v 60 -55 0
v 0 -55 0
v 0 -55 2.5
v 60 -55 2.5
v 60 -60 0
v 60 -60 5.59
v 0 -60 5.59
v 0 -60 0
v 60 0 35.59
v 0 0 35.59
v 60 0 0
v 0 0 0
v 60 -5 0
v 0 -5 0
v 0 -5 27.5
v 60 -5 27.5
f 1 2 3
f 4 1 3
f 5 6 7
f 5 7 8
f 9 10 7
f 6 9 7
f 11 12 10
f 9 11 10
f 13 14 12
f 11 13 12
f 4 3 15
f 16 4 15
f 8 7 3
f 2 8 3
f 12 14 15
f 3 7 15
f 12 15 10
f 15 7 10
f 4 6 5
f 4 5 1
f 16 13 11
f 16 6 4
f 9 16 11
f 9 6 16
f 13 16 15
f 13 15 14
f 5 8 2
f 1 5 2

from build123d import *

# Parameters (mm, degrees)
F1_DEPTH = 60


with BuildPart() as f1:
    # F0 (on Right) → F1 (new body)
    with BuildSketch(Plane.YZ):
        Polygon((-5, 0), (0, 0), (0, 30), (-5, 27.5), align=None)
        Polygon((-5, 27.5), (0, 30), (0, 35.59017), (-60, 5.59017), (-60, 0), (-55, 2.5), align=None)
        Polygon((-55, 0), (-55, 2.5), (-60, 0), align=None)
    extrude(amount=F1_DEPTH)


solid = f1.part
